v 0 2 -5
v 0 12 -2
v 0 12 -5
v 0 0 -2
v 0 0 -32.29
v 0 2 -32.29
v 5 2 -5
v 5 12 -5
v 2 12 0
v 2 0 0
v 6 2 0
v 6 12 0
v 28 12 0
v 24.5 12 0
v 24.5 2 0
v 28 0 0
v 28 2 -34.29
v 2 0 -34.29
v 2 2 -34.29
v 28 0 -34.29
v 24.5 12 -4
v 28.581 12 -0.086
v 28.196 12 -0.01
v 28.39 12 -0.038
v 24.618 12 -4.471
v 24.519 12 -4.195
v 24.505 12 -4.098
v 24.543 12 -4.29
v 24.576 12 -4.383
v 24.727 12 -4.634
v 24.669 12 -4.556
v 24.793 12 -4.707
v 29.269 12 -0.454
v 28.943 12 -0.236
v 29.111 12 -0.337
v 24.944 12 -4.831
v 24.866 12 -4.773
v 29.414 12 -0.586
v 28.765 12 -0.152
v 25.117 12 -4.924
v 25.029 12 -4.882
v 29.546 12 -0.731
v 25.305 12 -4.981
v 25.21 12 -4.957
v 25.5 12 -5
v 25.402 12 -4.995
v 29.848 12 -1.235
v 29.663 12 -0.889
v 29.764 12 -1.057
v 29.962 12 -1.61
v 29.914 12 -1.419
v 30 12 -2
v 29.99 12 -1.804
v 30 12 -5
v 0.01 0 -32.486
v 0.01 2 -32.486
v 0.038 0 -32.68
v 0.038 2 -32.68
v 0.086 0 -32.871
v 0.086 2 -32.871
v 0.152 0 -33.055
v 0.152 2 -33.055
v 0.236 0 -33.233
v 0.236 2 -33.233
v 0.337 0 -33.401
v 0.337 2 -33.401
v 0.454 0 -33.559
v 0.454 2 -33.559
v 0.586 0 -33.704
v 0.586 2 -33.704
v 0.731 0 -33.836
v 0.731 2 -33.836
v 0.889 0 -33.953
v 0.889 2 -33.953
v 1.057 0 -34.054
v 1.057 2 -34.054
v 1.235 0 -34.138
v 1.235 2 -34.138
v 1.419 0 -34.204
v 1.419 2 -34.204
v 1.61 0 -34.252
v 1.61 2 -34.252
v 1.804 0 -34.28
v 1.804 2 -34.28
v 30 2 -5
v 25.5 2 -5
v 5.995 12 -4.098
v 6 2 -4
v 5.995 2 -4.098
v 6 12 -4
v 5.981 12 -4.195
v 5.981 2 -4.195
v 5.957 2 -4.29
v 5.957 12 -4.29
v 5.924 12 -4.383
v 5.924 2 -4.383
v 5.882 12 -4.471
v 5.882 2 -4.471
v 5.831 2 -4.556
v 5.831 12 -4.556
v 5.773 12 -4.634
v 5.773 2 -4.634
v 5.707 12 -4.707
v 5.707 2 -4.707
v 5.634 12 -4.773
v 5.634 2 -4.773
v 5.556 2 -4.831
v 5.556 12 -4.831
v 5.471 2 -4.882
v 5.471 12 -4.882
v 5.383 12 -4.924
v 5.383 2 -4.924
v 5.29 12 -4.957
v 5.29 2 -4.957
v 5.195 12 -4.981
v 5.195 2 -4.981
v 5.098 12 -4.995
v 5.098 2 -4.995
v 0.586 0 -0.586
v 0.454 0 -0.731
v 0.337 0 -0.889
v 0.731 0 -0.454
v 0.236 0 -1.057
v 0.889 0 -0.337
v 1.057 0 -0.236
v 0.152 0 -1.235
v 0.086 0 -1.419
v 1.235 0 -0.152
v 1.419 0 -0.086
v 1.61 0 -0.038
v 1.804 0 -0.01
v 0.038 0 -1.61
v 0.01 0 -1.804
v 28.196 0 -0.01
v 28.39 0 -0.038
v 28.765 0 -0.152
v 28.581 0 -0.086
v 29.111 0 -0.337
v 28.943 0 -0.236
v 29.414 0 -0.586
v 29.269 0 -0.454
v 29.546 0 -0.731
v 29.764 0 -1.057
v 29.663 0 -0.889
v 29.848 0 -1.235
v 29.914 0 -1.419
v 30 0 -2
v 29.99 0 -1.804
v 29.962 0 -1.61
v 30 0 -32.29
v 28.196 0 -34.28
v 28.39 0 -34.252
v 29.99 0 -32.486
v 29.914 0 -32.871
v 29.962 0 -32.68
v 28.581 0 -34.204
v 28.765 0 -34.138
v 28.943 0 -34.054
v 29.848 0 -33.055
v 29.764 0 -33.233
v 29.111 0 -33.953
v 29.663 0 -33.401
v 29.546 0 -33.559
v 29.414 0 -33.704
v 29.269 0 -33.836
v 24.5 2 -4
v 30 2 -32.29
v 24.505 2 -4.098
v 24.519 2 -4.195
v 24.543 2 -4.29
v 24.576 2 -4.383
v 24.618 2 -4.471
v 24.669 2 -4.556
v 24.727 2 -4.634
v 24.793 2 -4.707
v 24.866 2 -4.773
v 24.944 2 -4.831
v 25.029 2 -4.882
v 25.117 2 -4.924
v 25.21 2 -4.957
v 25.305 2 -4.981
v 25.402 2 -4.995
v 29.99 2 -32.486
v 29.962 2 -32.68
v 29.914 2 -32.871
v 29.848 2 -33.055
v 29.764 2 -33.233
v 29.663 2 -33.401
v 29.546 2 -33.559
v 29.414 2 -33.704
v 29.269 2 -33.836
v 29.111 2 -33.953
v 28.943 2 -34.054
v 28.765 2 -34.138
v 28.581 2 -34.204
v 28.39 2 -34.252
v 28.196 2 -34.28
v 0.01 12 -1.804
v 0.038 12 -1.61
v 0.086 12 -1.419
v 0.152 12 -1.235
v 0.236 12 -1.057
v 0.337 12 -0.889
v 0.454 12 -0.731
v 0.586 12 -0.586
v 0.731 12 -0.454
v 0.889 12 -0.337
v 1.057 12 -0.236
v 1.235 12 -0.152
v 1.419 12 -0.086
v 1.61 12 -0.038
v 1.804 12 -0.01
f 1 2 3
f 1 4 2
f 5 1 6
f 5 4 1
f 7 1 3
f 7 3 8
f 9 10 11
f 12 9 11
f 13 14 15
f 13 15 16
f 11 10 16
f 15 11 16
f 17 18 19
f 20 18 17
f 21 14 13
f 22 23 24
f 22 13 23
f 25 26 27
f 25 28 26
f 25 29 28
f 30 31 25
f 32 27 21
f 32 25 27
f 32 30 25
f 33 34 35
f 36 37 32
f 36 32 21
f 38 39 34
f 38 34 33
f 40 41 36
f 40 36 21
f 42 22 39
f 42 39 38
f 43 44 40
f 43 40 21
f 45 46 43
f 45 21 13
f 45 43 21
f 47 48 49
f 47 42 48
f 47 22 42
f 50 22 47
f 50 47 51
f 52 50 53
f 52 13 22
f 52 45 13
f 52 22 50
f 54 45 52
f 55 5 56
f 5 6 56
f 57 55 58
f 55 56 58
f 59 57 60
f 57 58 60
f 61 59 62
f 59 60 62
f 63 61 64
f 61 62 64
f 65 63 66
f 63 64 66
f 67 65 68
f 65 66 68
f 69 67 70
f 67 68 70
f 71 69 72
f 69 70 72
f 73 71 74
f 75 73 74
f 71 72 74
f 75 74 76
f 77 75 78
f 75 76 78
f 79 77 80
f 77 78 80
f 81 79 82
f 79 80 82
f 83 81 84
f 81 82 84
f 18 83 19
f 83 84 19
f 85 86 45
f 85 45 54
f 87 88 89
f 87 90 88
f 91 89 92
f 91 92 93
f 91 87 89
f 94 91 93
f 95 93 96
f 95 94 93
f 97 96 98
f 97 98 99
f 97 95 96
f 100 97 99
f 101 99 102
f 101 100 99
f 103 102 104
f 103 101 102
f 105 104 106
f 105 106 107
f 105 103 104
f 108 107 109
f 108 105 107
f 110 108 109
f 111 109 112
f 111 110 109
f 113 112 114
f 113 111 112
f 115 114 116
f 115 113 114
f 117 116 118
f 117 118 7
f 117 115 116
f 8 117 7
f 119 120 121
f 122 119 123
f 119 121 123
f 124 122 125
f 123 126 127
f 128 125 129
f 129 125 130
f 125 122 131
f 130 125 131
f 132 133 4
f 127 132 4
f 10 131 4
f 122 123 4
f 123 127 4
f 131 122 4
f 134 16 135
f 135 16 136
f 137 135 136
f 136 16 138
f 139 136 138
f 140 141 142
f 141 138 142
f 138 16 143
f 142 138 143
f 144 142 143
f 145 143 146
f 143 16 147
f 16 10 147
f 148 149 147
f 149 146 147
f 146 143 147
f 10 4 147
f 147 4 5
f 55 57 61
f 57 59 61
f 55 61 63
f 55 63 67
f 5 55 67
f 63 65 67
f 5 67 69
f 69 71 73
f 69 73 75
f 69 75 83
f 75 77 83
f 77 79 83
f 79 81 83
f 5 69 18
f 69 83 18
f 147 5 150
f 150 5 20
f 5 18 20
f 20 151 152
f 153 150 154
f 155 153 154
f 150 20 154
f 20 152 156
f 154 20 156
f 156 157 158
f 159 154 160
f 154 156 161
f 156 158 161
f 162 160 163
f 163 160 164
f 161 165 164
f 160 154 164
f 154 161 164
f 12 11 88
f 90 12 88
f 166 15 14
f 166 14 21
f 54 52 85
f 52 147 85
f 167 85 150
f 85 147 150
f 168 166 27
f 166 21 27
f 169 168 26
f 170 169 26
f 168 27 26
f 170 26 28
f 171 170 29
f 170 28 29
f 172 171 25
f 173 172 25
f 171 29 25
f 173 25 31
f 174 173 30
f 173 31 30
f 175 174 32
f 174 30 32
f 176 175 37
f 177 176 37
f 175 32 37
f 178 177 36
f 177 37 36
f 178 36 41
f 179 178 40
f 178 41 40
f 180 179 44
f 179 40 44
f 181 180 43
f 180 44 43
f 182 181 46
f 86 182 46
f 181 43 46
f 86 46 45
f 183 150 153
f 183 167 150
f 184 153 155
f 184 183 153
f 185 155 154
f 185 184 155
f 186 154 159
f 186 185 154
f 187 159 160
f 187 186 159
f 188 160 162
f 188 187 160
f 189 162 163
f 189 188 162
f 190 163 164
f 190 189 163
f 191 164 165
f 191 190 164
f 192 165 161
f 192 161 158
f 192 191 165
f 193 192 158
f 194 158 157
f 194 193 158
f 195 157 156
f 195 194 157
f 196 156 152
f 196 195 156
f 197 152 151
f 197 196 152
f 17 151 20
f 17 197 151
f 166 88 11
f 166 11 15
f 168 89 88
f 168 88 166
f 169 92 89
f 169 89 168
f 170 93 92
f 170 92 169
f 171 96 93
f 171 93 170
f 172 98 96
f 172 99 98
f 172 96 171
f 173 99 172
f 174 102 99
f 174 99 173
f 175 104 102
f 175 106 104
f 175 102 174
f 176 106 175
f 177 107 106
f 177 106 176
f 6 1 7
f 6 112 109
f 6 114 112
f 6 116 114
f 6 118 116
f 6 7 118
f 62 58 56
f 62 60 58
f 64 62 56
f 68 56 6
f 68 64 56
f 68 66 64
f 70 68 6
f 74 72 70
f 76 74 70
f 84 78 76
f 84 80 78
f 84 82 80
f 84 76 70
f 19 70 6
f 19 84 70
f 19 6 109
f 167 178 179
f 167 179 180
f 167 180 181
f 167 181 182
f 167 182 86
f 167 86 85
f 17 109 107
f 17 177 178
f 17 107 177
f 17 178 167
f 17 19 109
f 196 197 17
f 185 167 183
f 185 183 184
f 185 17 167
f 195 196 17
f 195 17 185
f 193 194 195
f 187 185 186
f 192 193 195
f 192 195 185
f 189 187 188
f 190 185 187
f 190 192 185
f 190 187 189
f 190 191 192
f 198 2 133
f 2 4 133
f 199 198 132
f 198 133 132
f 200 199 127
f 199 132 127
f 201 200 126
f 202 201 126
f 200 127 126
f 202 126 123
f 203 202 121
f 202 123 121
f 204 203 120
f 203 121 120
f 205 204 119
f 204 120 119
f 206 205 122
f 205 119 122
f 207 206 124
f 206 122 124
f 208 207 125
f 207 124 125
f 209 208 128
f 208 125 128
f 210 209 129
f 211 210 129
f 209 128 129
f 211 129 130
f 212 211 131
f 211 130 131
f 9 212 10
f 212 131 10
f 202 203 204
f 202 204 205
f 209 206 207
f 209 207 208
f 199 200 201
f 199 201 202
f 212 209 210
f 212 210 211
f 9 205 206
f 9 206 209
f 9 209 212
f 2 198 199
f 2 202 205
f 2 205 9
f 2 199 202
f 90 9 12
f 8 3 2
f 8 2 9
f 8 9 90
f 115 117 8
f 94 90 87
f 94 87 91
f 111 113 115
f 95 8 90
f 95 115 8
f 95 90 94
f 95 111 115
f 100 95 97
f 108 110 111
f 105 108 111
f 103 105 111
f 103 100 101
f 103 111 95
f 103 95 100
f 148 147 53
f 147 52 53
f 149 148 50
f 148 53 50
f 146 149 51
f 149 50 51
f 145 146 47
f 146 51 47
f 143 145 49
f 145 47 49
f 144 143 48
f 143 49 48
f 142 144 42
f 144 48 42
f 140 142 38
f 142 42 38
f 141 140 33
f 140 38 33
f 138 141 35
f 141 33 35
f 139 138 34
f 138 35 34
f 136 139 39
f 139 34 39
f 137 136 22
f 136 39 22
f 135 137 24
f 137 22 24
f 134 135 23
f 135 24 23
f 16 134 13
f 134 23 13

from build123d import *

# Parameters (mm, degrees)
SKETCH2_W           = 30
SKETCH2_H           = 34.29
BOSS_EXTRUDE1_DEPTH = 2
SKETCH3_W           = 5.5
SKETCH3_H           = 5
SKETCH3_W_2         = 6
BOSS_EXTRUDE2_DEPTH = 10
FILLET2_R           = 2
FILLET3_R           = 1


with BuildPart() as part:
    # Sketch2 → Boss-Extrude1 (new body)
    with BuildSketch(Plane(origin=(0, 0, 0), x_dir=(1, 0, 0), z_dir=(0, 1, 0))):
        with Locations((15, 17.145)):
            Rectangle(SKETCH2_W, SKETCH2_H)
    extrude(amount=BOSS_EXTRUDE1_DEPTH)

    # Sketch3 → Boss-Extrude2 (add)
    with BuildSketch(Plane(origin=(0, 2, 0), x_dir=(1, 0, 0), z_dir=(0, 1, 0))):
        with Locations((27.25, 2.5)):
            Rectangle(SKETCH3_W, SKETCH3_H)
        with Locations((3, 2.5)):
            Rectangle(SKETCH3_W_2, SKETCH3_H)
    extrude(amount=BOSS_EXTRUDE2_DEPTH)

    # Fillet2
    fillet2_edges = [part.edges().sort_by_distance(p)[0] for p in [
        (0, 1, -34.29),
        (30, 1, -34.29),
        (30, 6, 0),
        (0, 6, 0),
    ]]
    fillet(fillet2_edges, radius=FILLET2_R)

    # Fillet3
    fillet3_edges = [part.edges().sort_by_distance(p)[0] for p in [
        (24.5, 7, -5),
        (6, 7, -5),
    ]]
    fillet(fillet3_edges, radius=FILLET3_R)


solid = part.part
